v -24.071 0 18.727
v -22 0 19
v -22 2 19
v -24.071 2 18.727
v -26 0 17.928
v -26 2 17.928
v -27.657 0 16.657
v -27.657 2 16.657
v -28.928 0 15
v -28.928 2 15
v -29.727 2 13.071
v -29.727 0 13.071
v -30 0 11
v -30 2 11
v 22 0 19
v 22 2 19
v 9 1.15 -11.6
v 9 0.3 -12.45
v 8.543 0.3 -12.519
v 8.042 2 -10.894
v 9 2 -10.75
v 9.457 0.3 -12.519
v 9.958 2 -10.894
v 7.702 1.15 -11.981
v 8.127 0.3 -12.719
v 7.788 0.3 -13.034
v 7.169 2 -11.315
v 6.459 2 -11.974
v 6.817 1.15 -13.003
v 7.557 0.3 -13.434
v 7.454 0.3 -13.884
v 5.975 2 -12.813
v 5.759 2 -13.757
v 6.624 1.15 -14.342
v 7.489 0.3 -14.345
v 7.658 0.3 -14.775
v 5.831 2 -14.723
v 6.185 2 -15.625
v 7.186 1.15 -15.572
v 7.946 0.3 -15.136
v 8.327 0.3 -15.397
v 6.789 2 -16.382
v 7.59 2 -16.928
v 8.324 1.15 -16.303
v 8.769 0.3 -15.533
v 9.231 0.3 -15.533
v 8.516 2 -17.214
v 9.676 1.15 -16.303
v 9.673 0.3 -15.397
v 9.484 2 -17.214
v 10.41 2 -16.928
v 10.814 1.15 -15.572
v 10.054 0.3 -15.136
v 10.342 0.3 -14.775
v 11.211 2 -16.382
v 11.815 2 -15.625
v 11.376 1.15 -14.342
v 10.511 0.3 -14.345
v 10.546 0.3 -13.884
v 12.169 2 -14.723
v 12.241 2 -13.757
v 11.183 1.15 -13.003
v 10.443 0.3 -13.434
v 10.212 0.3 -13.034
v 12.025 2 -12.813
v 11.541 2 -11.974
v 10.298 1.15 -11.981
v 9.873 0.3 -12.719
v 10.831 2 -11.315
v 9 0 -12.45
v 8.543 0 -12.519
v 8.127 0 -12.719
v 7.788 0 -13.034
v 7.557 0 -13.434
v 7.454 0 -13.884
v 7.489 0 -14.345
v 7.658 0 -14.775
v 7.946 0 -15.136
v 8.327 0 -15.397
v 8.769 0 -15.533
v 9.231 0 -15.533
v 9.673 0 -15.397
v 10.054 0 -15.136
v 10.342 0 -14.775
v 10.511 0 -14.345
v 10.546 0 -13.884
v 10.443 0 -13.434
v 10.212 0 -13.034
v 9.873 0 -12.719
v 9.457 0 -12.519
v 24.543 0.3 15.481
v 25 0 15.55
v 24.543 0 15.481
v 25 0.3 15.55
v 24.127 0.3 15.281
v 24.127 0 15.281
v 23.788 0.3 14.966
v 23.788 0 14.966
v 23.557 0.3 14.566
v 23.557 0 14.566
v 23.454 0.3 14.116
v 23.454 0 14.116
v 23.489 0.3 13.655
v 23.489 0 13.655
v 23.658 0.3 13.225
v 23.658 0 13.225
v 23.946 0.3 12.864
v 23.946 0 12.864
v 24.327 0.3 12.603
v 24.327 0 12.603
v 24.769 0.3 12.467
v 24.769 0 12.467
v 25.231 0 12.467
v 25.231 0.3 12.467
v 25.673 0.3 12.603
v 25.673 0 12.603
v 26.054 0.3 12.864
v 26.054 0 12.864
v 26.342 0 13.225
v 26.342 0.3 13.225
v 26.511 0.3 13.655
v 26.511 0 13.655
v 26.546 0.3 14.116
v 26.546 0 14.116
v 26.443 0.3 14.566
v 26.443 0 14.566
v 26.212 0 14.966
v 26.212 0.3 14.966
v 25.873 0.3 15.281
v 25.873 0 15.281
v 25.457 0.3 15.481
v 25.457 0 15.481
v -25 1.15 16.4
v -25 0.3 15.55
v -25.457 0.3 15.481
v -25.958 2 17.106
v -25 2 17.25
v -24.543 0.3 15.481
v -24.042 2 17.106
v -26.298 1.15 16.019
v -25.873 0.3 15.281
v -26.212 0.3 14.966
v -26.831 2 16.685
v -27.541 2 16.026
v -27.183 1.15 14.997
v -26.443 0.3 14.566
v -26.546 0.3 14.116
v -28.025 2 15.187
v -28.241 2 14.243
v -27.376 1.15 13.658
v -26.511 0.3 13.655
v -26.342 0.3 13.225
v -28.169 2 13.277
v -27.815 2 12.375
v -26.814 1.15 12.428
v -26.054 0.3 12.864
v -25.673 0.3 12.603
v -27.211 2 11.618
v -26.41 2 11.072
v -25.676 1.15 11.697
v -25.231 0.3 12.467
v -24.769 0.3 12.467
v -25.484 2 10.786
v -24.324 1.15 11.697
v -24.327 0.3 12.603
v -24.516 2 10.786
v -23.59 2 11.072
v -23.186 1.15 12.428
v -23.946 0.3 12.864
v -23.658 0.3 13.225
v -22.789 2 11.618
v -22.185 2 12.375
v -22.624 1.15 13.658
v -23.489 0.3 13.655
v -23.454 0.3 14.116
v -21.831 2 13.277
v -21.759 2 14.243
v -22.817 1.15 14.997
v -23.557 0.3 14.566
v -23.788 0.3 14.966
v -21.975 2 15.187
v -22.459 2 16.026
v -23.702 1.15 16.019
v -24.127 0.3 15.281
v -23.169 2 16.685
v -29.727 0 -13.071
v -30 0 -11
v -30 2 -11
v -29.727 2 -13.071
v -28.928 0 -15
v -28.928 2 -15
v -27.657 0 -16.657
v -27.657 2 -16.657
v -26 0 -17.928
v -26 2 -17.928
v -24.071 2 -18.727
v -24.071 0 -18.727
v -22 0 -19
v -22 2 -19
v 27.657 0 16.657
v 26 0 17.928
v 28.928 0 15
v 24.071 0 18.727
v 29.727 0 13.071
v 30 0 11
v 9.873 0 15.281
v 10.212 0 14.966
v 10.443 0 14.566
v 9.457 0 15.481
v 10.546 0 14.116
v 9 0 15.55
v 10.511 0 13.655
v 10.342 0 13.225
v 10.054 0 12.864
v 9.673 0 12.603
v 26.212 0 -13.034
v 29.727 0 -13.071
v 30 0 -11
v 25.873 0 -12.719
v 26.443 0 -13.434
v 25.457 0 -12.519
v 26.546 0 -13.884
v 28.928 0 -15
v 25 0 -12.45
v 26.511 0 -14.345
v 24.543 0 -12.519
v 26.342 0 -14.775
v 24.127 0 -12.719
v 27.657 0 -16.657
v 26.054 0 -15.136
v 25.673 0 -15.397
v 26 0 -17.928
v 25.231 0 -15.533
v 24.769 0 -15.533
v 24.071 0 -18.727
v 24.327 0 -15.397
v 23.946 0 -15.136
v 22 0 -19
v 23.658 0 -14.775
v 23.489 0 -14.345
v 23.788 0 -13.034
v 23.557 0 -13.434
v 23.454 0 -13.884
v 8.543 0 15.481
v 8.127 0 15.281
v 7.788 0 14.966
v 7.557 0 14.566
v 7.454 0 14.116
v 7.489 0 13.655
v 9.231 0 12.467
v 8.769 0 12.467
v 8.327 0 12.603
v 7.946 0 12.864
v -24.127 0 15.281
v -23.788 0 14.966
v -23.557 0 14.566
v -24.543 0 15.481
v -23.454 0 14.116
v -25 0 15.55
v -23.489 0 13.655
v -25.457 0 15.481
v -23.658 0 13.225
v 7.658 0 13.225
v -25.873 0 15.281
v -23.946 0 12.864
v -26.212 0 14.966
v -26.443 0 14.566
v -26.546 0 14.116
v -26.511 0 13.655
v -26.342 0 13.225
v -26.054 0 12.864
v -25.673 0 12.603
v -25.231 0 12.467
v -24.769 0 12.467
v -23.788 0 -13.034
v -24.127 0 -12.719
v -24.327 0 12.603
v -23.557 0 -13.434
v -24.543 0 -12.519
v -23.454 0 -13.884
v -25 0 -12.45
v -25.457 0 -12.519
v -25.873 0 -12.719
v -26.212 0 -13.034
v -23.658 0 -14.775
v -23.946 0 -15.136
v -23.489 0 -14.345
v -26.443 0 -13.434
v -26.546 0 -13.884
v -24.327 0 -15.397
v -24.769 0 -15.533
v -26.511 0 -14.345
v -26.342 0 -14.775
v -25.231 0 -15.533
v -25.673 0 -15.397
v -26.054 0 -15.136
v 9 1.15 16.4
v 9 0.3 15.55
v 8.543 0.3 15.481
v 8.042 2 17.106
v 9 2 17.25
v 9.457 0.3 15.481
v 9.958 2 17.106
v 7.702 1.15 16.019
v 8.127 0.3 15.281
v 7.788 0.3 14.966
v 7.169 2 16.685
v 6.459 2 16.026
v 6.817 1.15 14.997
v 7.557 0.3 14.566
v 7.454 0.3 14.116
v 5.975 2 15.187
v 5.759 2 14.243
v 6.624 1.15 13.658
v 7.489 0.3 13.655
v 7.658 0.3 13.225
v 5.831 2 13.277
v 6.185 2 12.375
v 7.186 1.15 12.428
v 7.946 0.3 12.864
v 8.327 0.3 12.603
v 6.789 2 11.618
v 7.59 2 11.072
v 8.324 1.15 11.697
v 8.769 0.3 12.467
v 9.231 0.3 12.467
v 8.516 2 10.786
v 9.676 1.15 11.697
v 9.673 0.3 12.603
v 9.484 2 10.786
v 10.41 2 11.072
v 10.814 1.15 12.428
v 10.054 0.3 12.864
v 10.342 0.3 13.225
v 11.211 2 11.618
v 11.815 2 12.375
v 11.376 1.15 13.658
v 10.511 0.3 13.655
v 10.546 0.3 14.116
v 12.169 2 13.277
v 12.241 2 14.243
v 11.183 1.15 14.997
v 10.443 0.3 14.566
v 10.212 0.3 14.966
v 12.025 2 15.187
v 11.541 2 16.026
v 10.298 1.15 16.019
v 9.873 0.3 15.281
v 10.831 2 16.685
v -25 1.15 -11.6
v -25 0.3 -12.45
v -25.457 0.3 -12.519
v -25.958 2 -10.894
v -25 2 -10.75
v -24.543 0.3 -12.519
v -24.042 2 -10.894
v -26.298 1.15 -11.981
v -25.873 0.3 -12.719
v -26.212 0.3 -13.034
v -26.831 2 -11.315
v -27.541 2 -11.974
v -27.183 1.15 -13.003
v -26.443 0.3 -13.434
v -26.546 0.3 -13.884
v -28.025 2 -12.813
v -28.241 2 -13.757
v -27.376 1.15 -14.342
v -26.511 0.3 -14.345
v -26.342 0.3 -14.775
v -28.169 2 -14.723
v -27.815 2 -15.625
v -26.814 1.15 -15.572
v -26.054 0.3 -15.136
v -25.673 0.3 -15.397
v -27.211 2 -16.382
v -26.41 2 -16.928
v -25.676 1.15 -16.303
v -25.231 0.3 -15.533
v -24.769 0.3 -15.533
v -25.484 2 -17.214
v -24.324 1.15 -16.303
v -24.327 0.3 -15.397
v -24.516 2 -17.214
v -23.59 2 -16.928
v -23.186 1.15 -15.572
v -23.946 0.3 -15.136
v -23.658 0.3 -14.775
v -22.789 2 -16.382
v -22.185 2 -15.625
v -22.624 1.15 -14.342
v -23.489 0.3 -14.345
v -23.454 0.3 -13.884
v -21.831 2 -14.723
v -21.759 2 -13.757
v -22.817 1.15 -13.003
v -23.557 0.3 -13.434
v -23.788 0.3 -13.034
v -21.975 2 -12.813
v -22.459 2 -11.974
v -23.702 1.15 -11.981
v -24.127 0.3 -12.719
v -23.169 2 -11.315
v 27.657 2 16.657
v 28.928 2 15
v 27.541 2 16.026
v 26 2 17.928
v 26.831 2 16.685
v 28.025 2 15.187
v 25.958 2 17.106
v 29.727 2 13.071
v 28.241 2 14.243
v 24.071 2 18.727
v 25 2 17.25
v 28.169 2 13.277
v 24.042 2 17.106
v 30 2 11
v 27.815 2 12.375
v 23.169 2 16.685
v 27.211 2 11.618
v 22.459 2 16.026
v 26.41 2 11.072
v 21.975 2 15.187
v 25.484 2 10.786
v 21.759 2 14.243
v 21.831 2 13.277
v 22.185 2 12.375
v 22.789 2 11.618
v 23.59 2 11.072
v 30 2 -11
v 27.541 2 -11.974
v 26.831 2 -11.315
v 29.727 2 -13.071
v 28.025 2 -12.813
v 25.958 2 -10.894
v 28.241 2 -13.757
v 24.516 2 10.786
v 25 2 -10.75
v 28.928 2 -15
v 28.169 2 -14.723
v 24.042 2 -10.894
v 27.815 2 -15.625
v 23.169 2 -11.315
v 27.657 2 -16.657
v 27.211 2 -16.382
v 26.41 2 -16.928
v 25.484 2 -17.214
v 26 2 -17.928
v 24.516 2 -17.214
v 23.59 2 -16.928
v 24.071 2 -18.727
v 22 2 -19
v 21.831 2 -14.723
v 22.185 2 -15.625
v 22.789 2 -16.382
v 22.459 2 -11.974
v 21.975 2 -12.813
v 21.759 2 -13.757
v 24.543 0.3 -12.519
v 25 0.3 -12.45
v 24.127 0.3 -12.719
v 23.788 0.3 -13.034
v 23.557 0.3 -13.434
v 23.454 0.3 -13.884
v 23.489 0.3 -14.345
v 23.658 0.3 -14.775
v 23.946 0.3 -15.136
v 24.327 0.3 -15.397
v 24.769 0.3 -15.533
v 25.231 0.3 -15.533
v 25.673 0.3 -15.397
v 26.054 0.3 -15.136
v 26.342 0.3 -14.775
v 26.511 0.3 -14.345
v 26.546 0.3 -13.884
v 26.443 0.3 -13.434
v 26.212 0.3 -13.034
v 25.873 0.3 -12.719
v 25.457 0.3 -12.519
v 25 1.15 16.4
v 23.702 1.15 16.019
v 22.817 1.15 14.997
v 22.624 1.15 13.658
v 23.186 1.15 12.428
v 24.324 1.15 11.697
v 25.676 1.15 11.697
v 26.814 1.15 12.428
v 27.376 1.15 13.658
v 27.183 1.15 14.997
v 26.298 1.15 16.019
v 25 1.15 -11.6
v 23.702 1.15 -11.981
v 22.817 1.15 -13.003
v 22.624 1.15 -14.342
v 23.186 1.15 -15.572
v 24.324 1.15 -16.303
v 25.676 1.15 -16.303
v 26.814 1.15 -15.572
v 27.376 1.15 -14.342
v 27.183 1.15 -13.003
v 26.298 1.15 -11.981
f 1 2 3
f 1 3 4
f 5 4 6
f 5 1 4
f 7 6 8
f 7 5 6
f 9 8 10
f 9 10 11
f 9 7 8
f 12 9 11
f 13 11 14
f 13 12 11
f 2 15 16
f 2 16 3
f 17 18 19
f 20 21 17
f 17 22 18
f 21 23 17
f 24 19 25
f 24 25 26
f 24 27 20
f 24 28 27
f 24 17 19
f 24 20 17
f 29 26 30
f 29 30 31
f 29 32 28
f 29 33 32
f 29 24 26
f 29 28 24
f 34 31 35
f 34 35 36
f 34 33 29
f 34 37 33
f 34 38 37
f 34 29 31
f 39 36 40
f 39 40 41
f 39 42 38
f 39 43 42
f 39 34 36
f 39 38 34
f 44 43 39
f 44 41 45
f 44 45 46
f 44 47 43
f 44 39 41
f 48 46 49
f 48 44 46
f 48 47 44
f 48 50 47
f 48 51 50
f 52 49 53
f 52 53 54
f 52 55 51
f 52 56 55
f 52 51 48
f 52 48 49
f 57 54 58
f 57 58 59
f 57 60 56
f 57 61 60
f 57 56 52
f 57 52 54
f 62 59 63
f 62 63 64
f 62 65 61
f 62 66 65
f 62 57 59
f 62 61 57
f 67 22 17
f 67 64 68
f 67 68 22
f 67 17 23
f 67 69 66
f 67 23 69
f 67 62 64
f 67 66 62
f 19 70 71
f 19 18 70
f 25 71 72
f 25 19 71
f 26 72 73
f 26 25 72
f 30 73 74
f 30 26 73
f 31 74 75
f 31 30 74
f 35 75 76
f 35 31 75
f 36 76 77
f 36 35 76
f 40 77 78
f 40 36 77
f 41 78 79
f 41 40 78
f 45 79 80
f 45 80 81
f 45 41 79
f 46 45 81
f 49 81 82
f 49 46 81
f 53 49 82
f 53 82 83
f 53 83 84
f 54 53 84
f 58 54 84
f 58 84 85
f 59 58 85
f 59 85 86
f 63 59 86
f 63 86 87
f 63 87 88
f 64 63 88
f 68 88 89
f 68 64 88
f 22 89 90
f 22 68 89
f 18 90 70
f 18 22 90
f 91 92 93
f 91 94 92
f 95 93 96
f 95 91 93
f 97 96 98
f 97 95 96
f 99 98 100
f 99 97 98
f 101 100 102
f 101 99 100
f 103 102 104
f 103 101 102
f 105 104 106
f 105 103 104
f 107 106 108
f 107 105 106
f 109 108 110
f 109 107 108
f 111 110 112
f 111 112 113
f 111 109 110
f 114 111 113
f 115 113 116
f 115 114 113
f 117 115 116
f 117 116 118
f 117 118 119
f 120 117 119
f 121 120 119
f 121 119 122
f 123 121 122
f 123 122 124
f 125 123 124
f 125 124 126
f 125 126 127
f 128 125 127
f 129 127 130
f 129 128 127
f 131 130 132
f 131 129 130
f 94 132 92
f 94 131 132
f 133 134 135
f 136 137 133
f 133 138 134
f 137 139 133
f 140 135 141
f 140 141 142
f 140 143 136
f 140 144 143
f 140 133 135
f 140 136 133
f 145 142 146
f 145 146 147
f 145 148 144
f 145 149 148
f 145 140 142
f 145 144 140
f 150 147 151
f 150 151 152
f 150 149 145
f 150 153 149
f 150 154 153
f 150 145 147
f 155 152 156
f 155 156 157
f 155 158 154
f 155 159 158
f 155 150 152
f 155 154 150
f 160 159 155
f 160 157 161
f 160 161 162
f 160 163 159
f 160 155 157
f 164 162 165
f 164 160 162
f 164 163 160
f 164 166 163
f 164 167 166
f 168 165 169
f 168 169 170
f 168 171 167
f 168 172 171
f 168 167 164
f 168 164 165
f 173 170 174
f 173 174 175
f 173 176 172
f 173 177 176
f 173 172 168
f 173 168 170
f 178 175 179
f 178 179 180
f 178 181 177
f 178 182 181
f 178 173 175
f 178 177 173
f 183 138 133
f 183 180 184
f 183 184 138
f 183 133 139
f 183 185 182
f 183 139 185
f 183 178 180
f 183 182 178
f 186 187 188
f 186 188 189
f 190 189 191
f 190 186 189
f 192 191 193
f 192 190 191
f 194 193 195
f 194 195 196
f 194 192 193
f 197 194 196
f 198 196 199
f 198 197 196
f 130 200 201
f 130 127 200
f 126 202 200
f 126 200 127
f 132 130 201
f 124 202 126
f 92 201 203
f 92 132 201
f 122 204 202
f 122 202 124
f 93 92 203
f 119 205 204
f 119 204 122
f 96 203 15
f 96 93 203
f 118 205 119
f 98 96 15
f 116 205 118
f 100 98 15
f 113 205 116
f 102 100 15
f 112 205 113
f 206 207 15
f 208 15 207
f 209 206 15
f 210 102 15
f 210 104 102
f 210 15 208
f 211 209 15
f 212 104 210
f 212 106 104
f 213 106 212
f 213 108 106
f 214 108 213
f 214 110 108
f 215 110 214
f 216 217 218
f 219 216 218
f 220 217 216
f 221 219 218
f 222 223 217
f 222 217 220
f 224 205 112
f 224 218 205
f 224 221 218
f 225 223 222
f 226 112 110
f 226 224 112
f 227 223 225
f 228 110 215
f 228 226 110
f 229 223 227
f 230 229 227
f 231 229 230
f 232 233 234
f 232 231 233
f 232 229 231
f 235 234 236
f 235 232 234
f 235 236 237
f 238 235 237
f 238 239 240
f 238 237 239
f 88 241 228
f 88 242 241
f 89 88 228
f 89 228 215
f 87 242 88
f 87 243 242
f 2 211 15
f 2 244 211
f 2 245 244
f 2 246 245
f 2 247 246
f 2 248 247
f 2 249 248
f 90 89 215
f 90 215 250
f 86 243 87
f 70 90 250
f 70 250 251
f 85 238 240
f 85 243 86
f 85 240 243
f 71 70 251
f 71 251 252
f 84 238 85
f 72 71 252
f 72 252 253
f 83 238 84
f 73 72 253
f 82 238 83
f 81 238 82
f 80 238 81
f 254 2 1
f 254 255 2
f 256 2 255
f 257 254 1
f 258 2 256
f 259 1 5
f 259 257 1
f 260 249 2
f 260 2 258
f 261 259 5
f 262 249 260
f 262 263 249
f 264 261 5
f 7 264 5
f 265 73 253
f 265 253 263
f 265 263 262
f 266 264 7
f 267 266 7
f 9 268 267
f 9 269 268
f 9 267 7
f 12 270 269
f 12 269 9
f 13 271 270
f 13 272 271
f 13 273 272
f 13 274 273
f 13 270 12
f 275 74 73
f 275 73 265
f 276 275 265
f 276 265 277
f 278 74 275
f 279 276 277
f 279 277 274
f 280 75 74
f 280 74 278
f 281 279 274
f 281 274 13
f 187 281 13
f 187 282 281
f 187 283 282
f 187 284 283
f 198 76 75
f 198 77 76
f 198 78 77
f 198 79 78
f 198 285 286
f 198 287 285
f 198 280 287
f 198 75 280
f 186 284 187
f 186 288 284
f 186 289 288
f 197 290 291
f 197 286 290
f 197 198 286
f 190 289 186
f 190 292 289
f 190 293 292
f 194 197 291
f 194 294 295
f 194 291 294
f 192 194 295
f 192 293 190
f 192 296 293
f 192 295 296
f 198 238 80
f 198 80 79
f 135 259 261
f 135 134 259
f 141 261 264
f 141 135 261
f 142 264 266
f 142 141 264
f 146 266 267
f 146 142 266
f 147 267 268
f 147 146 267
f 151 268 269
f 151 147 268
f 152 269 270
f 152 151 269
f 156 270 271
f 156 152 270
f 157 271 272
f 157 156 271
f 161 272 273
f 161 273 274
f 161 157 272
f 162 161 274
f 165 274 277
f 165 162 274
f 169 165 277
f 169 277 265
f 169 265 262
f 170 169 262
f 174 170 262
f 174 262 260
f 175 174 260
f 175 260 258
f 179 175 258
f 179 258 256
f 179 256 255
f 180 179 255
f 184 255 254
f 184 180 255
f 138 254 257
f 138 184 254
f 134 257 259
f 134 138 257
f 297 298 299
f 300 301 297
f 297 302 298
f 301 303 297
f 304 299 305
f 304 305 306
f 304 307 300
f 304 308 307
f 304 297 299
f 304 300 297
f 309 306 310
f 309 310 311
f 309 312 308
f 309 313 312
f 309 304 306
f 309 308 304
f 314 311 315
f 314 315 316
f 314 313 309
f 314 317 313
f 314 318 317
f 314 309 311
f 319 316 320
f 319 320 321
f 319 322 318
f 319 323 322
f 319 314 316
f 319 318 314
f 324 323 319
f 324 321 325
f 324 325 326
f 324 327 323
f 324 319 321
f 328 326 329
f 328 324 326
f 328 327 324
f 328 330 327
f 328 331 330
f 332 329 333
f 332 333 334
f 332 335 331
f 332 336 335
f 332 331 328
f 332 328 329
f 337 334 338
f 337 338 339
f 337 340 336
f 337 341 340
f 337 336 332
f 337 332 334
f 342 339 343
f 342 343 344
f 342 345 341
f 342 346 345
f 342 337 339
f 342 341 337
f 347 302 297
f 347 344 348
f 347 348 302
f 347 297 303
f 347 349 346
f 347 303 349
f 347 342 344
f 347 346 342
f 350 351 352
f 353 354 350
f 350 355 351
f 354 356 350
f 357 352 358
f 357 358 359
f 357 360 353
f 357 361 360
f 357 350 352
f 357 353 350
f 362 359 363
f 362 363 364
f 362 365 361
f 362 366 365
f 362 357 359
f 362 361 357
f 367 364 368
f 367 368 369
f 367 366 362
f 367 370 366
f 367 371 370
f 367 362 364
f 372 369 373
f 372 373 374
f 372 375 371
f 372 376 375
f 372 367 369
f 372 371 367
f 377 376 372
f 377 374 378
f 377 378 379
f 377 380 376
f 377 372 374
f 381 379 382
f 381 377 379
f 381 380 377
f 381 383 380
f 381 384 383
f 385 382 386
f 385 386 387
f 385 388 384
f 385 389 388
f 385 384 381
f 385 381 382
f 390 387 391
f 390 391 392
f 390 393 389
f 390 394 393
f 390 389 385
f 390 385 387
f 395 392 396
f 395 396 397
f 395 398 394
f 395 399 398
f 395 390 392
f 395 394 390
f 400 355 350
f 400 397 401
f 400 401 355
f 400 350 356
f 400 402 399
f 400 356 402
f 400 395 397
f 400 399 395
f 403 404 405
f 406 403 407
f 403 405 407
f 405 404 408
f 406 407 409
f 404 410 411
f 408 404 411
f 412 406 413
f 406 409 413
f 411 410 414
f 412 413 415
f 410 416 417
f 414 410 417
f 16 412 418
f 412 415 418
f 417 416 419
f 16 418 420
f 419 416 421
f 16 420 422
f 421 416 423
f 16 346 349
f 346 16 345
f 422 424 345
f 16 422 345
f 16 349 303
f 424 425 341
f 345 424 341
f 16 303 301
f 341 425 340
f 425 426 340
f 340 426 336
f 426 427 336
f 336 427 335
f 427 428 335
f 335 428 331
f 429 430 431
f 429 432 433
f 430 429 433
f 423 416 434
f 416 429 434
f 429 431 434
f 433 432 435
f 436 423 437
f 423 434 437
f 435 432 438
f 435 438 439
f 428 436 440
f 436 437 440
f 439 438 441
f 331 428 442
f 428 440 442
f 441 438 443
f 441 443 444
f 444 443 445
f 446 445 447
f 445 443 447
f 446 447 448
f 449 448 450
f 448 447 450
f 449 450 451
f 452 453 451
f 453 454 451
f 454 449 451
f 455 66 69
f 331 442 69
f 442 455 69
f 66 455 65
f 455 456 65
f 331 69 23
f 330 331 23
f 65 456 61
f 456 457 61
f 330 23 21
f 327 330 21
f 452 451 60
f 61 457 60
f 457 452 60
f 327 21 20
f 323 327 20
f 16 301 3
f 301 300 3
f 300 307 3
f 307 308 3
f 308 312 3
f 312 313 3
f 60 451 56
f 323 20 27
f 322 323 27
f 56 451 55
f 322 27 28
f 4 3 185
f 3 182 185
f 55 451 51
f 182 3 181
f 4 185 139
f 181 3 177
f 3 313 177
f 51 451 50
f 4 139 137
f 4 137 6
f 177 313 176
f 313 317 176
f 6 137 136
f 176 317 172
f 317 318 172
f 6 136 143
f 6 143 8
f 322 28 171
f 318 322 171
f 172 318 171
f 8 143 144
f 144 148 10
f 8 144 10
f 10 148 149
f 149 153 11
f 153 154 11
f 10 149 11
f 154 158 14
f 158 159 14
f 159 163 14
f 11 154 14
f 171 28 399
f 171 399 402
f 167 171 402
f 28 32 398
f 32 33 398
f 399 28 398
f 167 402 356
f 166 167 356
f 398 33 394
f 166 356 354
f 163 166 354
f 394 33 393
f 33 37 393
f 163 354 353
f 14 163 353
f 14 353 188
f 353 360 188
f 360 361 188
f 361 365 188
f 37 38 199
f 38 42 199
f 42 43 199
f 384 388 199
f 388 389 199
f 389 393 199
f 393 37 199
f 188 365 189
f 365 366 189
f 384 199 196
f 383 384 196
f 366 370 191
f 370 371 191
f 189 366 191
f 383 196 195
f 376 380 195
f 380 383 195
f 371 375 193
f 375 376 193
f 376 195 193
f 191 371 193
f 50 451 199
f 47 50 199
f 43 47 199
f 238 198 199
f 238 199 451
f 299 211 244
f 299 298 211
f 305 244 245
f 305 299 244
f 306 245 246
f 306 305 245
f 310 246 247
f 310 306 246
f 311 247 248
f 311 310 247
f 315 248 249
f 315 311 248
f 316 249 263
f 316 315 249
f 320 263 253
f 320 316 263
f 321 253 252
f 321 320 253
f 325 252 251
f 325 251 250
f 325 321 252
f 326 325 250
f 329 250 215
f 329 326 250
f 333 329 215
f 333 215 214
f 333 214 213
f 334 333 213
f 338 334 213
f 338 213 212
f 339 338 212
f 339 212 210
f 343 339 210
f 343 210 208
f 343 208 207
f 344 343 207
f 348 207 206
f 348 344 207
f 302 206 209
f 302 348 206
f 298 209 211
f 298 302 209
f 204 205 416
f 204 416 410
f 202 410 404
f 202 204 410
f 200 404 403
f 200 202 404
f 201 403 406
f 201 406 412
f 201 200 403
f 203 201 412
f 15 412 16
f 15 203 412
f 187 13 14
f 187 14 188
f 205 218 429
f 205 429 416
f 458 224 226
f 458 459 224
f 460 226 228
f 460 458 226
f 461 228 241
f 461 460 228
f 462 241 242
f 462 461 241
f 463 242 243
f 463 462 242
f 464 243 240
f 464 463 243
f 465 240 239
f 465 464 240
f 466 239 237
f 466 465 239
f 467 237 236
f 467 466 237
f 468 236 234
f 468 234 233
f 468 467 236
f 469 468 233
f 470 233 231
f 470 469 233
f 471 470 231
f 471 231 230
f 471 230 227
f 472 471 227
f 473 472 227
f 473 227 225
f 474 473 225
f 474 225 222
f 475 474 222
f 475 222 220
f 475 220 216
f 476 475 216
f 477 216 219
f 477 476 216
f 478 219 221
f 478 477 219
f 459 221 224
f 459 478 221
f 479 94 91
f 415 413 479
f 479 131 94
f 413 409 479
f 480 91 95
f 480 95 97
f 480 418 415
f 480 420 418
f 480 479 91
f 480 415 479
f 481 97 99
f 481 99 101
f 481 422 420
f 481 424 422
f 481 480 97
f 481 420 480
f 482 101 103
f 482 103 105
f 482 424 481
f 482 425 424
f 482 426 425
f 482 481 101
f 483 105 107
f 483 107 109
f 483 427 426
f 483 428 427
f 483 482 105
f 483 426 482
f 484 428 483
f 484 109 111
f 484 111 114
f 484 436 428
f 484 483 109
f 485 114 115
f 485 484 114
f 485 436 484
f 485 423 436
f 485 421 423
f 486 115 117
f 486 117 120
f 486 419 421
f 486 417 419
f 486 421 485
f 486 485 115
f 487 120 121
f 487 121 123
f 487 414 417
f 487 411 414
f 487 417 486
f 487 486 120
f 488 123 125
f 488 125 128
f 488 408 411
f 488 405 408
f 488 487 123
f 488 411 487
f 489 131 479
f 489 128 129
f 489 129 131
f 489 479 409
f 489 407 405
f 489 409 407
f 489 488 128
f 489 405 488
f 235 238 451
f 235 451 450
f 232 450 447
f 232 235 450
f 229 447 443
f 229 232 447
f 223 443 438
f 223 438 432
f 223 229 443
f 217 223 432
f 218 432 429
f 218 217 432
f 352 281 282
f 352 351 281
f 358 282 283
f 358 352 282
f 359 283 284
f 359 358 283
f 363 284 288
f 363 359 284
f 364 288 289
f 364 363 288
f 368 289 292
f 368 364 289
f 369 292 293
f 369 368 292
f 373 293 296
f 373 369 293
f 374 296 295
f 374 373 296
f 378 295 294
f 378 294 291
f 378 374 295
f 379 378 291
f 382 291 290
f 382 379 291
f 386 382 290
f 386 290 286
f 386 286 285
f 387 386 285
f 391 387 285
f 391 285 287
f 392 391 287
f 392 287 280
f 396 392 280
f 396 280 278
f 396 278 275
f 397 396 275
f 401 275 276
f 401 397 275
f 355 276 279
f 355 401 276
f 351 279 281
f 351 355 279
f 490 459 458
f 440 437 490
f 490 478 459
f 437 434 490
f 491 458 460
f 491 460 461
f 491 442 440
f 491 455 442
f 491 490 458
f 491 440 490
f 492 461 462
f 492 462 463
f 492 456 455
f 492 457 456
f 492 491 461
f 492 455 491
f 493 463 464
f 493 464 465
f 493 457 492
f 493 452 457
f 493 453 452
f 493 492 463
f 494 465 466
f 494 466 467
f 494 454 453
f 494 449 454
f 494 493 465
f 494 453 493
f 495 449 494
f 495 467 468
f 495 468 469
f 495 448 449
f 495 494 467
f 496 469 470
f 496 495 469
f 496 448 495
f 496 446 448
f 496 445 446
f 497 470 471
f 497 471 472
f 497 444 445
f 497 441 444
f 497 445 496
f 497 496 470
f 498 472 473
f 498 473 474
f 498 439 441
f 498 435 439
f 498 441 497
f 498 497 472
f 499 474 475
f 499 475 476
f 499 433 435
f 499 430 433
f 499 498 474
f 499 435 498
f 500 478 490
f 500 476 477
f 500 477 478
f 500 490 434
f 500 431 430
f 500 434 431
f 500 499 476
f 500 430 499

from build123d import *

# Parameters (mm, degrees)
BOSS_EXTRUDE1_DEPTH                 = 2
F_3_1_3_1_DIAMETER_HOLE1_AT_2_COUNT = 2
F_3_1_3_1_DIAMETER_HOLE1_AT_2_PITCH = 28
F_3_1_3_1_DIAMETER_HOLE1_AT_3_COUNT = 2
F_3_1_3_1_DIAMETER_HOLE1_AT_3_PITCH = 57.306195128
F_3_1_3_1_DIAMETER_HOLE1_AT_4_COUNT = 2
F_3_1_3_1_DIAMETER_HOLE1_AT_4_PITCH = 50
F_3_1_3_1_DIAMETER_HOLE1_AT_5_COUNT = 2
F_3_1_3_1_DIAMETER_HOLE1_AT_5_PITCH = 16
F_3_1_3_1_DIAMETER_HOLE1_AT_6_COUNT = 2
F_3_1_3_1_DIAMETER_HOLE1_AT_6_PITCH = 32.249030993


with BuildPart() as part:
    # Sketch1 → Boss-Extrude1 (new body)
    with BuildSketch(Plane(origin=(0, 0, 0), x_dir=(1, 0, 0), z_dir=(0, 1, 0))):
        with BuildLine():
            Line((22, -19), (-22, -19))
            ThreePointArc((-22, -19), (-27.656854249, -16.656854249), (-30, -11))
            Line((-30, -11), (-30, 11))
            ThreePointArc((-30, 11), (-27.656854249, 16.656854249), (-22, 19))
            Line((-22, 19), (22, 19))
            ThreePointArc((22, 19), (27.656854249, 16.656854249), (30, 11))
            Line((30, 11), (30, -11))
            ThreePointArc((30, -11), (27.656854249, -16.656854249), (22, -19))
        make_face()
    extrude(amount=BOSS_EXTRUDE1_DEPTH)

    # Hole → Ø3.1 (3.1) Diameter Hole1 (revolve, cut)
    with BuildSketch(Plane(origin=(25, 2, -14), x_dir=(0, 0, 1), z_dir=(1, 0, 0))):
        Polygon((0, 0), (0, 2), (1.55, 2), (1.55, 1.7), (3.25, 0), align=None)
    f_3_1_3_1_diameter_hole1 = revolve(axis=Axis((25, 8.35, -14), (0, -1, 0)), mode=Mode.SUBTRACT)

    # Ø3.1 (3.1) Diameter Hole1 at 2: Ø3.1 (3.1) Diameter Hole1 ×2
    with Locations(*[(0, 0, i * F_3_1_3_1_DIAMETER_HOLE1_AT_2_PITCH) for i in range(1, F_3_1_3_1_DIAMETER_HOLE1_AT_2_COUNT)]):
        add(f_3_1_3_1_diameter_hole1, mode=Mode.SUBTRACT)

    # Ø3.1 (3.1) Diameter Hole1 at 3: Ø3.1 (3.1) Diameter Hole1 ×2
    with Locations(*[Vector(-0.872506016, 0, 0.488603369) * (i * F_3_1_3_1_DIAMETER_HOLE1_AT_3_PITCH) for i in range(1, F_3_1_3_1_DIAMETER_HOLE1_AT_3_COUNT)]):
        add(f_3_1_3_1_diameter_hole1, mode=Mode.SUBTRACT)

    # Ø3.1 (3.1) Diameter Hole1 at 4: Ø3.1 (3.1) Diameter Hole1 ×2
    with Locations(*[(-i * F_3_1_3_1_DIAMETER_HOLE1_AT_4_PITCH, 0, 0) for i in range(1, F_3_1_3_1_DIAMETER_HOLE1_AT_4_COUNT)]):
        add(f_3_1_3_1_diameter_hole1, mode=Mode.SUBTRACT)

    # Ø3.1 (3.1) Diameter Hole1 at 5: Ø3.1 (3.1) Diameter Hole1 ×2
    with Locations(*[(-i * F_3_1_3_1_DIAMETER_HOLE1_AT_5_PITCH, 0, 0) for i in range(1, F_3_1_3_1_DIAMETER_HOLE1_AT_5_COUNT)]):
        add(f_3_1_3_1_diameter_hole1, mode=Mode.SUBTRACT)

    # Ø3.1 (3.1) Diameter Hole1 at 6: Ø3.1 (3.1) Diameter Hole1 ×2
    with Locations(*[Vector(-0.496138938, 0, 0.868243142) * (i * F_3_1_3_1_DIAMETER_HOLE1_AT_6_PITCH) for i in range(1, F_3_1_3_1_DIAMETER_HOLE1_AT_6_COUNT)]):
        add(f_3_1_3_1_diameter_hole1, mode=Mode.SUBTRACT)


solid = part.part
